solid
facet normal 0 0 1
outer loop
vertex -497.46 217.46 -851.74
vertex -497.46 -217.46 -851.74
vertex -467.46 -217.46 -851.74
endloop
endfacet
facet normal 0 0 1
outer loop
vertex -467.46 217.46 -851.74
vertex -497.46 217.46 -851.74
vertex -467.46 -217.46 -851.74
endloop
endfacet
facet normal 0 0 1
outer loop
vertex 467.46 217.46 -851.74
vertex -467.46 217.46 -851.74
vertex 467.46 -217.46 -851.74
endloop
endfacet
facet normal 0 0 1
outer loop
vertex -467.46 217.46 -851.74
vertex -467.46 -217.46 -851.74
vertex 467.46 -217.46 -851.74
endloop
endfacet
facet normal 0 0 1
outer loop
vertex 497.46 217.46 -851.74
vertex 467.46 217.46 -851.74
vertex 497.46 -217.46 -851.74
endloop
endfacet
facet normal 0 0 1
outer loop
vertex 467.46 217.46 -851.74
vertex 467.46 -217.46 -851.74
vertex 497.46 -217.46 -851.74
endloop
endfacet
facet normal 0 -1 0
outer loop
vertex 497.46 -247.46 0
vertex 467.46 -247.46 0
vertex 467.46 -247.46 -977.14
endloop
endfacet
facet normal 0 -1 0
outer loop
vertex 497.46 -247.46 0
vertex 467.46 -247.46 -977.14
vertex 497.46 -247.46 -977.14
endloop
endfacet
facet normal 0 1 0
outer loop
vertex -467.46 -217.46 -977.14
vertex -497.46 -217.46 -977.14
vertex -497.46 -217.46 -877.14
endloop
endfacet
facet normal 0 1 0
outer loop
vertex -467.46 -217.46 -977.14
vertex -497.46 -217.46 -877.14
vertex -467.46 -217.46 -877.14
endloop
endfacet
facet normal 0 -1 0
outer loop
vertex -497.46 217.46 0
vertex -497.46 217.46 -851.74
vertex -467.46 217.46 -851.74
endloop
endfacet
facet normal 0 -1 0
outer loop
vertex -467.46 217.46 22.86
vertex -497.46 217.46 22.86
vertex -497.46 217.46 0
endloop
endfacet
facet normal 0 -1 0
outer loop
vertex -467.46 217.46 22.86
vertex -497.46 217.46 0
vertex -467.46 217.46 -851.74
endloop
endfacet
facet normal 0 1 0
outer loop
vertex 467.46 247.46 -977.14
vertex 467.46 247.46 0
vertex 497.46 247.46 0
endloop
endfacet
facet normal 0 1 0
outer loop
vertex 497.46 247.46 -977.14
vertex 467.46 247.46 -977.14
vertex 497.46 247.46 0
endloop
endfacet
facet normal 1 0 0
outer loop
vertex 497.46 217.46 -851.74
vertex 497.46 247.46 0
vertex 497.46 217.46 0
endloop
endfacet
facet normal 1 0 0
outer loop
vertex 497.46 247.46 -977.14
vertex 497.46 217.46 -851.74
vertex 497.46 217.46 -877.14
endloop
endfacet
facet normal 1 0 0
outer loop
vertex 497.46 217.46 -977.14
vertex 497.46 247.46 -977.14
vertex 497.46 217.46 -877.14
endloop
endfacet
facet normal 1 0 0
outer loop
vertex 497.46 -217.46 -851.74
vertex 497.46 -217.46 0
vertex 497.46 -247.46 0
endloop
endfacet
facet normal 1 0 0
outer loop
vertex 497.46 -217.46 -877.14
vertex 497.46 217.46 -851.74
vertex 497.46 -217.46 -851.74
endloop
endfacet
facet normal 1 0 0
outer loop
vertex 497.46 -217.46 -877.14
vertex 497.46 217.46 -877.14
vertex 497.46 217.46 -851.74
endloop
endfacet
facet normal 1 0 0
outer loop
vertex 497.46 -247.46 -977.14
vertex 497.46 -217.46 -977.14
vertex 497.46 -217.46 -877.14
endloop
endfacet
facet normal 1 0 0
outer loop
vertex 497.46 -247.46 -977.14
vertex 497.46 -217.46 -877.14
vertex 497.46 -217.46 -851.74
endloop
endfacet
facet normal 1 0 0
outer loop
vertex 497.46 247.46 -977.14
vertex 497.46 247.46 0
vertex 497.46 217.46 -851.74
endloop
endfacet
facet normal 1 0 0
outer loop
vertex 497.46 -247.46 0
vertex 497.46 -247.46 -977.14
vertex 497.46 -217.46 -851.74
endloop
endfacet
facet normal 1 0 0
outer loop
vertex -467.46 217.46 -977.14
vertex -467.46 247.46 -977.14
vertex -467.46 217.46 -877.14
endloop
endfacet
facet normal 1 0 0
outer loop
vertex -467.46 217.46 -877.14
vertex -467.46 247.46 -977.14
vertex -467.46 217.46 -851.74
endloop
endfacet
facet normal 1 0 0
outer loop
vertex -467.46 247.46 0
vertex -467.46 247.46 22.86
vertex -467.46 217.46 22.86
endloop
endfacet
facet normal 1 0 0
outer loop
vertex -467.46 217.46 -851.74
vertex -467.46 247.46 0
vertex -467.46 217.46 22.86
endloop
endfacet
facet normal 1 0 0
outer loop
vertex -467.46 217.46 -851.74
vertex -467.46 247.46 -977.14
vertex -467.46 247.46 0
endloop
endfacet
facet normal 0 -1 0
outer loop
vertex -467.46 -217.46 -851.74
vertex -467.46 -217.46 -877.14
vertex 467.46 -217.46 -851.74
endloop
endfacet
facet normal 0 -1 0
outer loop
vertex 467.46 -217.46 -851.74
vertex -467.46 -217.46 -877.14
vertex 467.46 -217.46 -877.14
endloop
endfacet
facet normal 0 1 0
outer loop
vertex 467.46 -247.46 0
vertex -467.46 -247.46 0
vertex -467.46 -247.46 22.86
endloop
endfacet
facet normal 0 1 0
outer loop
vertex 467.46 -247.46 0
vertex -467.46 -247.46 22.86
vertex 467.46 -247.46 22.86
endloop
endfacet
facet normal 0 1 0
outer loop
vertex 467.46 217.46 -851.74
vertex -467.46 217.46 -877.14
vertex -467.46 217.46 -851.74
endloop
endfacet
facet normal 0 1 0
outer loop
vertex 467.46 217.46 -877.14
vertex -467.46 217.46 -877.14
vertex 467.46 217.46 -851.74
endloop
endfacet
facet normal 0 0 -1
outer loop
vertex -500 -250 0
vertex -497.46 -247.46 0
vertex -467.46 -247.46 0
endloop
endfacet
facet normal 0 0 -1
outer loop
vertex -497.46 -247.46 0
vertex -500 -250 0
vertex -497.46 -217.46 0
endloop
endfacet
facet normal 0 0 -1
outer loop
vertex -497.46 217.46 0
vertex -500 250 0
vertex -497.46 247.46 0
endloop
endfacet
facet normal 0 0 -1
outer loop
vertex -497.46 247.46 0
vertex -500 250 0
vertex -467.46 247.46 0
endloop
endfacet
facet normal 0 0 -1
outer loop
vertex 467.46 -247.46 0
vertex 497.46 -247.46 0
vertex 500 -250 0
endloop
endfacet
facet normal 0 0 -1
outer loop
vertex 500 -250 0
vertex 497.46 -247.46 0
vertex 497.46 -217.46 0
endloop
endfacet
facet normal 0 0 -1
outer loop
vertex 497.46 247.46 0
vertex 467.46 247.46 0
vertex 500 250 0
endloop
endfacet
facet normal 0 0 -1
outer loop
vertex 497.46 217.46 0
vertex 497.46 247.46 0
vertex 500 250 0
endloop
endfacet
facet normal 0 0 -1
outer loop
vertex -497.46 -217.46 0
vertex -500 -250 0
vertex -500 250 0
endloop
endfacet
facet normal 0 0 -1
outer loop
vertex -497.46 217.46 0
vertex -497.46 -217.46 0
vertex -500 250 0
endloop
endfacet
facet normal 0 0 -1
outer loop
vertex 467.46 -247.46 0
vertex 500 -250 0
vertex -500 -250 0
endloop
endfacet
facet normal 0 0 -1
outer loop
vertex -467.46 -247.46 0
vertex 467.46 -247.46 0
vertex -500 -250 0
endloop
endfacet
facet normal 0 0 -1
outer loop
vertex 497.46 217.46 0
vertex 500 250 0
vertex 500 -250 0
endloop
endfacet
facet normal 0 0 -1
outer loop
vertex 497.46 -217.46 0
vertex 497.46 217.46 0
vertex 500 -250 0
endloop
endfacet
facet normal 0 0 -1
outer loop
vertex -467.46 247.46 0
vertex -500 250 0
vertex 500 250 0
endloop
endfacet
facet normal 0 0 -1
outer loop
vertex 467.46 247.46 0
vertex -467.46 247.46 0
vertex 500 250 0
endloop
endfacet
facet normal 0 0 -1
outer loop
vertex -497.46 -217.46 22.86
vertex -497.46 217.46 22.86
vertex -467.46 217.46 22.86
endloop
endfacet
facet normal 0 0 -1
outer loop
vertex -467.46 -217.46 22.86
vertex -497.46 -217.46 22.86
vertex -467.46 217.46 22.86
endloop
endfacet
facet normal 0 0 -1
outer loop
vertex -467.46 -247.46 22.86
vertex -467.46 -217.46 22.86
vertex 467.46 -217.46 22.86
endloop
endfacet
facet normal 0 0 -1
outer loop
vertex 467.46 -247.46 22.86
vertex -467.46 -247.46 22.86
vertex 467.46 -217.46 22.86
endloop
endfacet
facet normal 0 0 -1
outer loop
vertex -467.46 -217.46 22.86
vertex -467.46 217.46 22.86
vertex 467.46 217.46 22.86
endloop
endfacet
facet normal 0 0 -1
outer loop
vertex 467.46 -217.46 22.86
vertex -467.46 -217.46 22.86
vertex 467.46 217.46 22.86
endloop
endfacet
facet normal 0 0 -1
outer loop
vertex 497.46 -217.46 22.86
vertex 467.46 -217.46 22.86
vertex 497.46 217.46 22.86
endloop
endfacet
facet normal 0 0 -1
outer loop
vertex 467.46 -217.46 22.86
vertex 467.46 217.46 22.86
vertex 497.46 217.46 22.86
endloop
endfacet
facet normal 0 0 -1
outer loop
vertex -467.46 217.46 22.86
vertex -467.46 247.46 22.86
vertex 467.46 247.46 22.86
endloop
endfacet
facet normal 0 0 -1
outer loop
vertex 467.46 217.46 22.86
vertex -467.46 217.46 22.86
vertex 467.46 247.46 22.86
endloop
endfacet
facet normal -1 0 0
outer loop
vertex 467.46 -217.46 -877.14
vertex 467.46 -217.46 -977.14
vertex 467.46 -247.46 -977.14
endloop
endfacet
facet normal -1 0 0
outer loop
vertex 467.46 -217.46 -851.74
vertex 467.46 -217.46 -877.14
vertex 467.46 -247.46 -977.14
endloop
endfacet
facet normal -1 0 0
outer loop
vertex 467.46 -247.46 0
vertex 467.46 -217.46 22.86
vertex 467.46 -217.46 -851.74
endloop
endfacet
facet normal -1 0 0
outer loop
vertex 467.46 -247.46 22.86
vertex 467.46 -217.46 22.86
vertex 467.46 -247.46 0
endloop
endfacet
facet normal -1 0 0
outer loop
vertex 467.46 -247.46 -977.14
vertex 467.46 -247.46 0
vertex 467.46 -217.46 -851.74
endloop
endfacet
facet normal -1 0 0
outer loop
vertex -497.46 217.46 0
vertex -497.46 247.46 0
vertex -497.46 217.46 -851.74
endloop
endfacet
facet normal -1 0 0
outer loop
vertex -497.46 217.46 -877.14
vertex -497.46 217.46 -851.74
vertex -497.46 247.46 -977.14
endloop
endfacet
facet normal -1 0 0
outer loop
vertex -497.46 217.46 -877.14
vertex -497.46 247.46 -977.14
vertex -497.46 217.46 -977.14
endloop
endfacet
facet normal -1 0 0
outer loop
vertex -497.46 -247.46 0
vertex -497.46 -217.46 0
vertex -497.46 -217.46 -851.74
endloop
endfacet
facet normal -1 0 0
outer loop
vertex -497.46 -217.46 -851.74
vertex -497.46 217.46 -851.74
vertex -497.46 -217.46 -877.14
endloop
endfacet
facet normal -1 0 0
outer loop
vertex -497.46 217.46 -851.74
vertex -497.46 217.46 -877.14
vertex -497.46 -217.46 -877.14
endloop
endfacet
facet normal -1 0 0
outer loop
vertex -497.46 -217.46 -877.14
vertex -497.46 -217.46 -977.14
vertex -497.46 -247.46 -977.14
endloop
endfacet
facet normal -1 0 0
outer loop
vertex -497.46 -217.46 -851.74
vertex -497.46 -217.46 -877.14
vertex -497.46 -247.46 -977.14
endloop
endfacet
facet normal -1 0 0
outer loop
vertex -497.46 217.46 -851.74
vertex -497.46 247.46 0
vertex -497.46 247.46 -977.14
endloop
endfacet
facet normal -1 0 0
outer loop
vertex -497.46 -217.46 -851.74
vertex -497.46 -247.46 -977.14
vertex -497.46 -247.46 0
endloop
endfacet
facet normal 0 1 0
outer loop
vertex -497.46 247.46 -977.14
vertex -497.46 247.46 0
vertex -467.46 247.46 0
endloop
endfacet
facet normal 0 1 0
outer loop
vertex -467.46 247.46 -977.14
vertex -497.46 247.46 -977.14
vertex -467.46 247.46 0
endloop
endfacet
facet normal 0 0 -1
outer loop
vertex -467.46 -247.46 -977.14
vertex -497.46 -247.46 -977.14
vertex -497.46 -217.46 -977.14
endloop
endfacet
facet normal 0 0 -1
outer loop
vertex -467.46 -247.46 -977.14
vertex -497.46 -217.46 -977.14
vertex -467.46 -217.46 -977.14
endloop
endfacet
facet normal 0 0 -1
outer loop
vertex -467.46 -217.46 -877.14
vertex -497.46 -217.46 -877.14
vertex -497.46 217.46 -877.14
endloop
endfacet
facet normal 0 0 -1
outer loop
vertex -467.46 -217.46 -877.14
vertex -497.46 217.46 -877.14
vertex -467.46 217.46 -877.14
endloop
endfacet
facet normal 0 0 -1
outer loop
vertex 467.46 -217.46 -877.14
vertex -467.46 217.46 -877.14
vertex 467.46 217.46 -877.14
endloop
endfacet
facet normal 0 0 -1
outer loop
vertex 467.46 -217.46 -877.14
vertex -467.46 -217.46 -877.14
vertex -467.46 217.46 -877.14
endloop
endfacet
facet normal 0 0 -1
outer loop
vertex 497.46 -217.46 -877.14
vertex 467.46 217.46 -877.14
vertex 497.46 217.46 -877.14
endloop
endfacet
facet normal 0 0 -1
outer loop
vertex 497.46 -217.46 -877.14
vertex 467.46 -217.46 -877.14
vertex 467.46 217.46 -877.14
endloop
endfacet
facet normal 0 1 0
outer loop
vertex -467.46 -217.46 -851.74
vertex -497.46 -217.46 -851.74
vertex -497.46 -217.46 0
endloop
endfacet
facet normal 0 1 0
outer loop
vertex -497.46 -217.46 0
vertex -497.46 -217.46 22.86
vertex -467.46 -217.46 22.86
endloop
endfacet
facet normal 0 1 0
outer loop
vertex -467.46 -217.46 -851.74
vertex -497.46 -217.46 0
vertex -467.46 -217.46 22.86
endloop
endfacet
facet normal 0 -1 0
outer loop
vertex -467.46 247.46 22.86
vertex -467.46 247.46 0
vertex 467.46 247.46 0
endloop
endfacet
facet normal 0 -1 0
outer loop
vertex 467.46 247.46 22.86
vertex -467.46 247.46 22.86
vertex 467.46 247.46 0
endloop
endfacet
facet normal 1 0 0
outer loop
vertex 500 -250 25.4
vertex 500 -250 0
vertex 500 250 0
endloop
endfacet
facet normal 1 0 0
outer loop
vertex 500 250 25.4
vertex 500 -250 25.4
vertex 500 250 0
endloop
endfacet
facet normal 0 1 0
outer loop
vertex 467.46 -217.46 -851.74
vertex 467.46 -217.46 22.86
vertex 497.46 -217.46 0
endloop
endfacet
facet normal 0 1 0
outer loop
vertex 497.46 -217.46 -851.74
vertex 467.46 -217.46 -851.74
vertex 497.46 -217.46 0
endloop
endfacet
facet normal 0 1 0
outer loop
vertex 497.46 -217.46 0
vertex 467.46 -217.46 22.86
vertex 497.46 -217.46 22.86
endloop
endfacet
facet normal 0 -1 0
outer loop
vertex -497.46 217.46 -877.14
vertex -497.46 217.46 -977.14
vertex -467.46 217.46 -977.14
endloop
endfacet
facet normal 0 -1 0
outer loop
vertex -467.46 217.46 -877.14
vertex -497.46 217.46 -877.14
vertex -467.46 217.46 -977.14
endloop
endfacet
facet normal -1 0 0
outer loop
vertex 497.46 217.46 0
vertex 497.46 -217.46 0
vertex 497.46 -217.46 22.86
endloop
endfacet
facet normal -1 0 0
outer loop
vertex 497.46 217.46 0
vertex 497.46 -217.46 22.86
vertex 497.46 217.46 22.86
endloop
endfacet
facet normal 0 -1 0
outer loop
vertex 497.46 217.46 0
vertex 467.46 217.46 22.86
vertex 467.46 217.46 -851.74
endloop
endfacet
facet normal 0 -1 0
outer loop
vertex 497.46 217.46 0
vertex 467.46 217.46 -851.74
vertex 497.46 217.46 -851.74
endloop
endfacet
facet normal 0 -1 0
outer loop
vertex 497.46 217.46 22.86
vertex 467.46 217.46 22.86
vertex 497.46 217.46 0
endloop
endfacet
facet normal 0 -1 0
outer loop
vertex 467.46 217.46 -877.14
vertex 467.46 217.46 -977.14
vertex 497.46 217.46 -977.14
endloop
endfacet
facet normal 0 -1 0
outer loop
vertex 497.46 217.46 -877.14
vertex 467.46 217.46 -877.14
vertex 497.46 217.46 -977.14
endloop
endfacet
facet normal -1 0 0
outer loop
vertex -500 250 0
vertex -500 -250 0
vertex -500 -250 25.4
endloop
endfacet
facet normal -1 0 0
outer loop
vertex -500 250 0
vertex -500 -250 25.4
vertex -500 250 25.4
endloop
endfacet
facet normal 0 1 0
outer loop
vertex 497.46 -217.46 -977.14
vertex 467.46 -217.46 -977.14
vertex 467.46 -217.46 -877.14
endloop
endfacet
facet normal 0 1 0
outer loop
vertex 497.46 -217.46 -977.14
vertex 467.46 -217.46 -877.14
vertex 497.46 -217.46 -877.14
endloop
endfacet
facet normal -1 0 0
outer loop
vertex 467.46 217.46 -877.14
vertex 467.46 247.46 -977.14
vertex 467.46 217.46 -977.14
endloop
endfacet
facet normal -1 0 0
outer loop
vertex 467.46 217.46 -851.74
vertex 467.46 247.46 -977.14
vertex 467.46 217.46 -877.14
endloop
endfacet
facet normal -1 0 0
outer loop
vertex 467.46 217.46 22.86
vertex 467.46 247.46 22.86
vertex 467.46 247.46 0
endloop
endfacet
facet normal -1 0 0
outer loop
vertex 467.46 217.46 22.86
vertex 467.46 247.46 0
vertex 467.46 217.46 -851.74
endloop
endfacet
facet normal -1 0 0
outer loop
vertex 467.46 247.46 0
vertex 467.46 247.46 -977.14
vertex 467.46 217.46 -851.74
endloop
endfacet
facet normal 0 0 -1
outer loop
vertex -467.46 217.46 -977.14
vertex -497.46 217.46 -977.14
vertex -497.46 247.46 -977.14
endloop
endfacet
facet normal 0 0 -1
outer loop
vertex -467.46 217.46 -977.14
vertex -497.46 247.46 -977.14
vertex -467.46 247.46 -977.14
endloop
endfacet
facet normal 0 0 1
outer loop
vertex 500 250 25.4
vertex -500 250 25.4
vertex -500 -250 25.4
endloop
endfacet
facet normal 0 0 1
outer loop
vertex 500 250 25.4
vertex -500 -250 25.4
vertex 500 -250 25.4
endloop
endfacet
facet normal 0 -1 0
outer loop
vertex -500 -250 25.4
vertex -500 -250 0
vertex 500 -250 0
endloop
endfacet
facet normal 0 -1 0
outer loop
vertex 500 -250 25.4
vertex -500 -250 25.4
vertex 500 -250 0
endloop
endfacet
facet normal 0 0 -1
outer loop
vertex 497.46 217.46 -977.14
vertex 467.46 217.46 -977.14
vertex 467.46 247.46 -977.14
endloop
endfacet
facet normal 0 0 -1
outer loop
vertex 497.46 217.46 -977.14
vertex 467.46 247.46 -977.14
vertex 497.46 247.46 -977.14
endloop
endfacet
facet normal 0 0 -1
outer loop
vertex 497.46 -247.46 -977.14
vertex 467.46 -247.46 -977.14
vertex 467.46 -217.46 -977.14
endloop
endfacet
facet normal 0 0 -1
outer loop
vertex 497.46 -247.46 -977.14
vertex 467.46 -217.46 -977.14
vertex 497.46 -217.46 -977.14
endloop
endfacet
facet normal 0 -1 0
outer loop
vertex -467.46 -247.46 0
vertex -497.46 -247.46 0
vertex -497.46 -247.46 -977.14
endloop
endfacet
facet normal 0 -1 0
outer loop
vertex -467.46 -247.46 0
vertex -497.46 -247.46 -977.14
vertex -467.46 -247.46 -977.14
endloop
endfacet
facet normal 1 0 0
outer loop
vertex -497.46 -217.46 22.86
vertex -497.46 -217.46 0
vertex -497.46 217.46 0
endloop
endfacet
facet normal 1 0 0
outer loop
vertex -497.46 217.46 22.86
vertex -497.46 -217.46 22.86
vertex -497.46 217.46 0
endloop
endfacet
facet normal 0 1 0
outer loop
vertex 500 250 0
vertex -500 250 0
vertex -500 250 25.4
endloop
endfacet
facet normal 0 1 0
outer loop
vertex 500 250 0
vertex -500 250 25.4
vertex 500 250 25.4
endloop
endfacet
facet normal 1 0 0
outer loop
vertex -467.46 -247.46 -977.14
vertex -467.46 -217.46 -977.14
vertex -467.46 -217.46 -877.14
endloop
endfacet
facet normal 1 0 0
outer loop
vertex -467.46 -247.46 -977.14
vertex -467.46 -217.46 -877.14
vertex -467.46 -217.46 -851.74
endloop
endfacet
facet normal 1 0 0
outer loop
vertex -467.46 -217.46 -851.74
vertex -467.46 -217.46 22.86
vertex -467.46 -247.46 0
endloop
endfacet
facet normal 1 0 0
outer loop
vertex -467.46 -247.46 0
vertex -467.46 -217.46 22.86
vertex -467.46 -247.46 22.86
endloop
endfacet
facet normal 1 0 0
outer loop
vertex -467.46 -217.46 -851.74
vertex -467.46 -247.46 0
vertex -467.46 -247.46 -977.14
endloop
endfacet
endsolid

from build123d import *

# Parameters (mm, degrees)
F0_W     = 1000
F0_H     = 500
F1_DEPTH = 25.4
F2_T     = -2.54
F3_W     = 30
F3_H     = 30
F4_DEPTH = 1000
F6_W     = 994.92
F6_H     = 434.92
F7_DEPTH = 25.4


with BuildPart() as f1:
    # F0 (on Top) → F1 (new body)
    with BuildSketch(Plane.XY):
        Rectangle(F0_W, F0_H)
    extrude(amount=F1_DEPTH)

    # F2
    f2_openings = [f1.faces().sort_by_distance(p)[0] for p in [
        (0, 0, 0),
    ]]
    offset(amount=F2_T, openings=f2_openings)

    # F3 (on face) → F4 (join)
    with BuildSketch(Plane(origin=(0, 0, 22.86), x_dir=(1, 0, 0), z_dir=(0, 0, -1))):
        with Locations((-482.46, 232.46)):
            Rectangle(F3_W, F3_H)
        with Locations((-482.46, -232.46)):
            Rectangle(F3_W, F3_H)
        with Locations((482.46, 232.46)):
            Rectangle(F3_W, F3_H)
        with Locations((482.46, -232.46)):
            Rectangle(F3_W, F3_H)
    extrude(amount=F4_DEPTH)

    # F6 (on offset) → F7 (join)
    with BuildSketch(Plane(origin=(0, 0, -877.14), x_dir=(1, 0, 0), z_dir=(0, 0, -1))):
        Rectangle(F6_W, F6_H)
    extrude(amount=-F7_DEPTH)


solid = f1.part
